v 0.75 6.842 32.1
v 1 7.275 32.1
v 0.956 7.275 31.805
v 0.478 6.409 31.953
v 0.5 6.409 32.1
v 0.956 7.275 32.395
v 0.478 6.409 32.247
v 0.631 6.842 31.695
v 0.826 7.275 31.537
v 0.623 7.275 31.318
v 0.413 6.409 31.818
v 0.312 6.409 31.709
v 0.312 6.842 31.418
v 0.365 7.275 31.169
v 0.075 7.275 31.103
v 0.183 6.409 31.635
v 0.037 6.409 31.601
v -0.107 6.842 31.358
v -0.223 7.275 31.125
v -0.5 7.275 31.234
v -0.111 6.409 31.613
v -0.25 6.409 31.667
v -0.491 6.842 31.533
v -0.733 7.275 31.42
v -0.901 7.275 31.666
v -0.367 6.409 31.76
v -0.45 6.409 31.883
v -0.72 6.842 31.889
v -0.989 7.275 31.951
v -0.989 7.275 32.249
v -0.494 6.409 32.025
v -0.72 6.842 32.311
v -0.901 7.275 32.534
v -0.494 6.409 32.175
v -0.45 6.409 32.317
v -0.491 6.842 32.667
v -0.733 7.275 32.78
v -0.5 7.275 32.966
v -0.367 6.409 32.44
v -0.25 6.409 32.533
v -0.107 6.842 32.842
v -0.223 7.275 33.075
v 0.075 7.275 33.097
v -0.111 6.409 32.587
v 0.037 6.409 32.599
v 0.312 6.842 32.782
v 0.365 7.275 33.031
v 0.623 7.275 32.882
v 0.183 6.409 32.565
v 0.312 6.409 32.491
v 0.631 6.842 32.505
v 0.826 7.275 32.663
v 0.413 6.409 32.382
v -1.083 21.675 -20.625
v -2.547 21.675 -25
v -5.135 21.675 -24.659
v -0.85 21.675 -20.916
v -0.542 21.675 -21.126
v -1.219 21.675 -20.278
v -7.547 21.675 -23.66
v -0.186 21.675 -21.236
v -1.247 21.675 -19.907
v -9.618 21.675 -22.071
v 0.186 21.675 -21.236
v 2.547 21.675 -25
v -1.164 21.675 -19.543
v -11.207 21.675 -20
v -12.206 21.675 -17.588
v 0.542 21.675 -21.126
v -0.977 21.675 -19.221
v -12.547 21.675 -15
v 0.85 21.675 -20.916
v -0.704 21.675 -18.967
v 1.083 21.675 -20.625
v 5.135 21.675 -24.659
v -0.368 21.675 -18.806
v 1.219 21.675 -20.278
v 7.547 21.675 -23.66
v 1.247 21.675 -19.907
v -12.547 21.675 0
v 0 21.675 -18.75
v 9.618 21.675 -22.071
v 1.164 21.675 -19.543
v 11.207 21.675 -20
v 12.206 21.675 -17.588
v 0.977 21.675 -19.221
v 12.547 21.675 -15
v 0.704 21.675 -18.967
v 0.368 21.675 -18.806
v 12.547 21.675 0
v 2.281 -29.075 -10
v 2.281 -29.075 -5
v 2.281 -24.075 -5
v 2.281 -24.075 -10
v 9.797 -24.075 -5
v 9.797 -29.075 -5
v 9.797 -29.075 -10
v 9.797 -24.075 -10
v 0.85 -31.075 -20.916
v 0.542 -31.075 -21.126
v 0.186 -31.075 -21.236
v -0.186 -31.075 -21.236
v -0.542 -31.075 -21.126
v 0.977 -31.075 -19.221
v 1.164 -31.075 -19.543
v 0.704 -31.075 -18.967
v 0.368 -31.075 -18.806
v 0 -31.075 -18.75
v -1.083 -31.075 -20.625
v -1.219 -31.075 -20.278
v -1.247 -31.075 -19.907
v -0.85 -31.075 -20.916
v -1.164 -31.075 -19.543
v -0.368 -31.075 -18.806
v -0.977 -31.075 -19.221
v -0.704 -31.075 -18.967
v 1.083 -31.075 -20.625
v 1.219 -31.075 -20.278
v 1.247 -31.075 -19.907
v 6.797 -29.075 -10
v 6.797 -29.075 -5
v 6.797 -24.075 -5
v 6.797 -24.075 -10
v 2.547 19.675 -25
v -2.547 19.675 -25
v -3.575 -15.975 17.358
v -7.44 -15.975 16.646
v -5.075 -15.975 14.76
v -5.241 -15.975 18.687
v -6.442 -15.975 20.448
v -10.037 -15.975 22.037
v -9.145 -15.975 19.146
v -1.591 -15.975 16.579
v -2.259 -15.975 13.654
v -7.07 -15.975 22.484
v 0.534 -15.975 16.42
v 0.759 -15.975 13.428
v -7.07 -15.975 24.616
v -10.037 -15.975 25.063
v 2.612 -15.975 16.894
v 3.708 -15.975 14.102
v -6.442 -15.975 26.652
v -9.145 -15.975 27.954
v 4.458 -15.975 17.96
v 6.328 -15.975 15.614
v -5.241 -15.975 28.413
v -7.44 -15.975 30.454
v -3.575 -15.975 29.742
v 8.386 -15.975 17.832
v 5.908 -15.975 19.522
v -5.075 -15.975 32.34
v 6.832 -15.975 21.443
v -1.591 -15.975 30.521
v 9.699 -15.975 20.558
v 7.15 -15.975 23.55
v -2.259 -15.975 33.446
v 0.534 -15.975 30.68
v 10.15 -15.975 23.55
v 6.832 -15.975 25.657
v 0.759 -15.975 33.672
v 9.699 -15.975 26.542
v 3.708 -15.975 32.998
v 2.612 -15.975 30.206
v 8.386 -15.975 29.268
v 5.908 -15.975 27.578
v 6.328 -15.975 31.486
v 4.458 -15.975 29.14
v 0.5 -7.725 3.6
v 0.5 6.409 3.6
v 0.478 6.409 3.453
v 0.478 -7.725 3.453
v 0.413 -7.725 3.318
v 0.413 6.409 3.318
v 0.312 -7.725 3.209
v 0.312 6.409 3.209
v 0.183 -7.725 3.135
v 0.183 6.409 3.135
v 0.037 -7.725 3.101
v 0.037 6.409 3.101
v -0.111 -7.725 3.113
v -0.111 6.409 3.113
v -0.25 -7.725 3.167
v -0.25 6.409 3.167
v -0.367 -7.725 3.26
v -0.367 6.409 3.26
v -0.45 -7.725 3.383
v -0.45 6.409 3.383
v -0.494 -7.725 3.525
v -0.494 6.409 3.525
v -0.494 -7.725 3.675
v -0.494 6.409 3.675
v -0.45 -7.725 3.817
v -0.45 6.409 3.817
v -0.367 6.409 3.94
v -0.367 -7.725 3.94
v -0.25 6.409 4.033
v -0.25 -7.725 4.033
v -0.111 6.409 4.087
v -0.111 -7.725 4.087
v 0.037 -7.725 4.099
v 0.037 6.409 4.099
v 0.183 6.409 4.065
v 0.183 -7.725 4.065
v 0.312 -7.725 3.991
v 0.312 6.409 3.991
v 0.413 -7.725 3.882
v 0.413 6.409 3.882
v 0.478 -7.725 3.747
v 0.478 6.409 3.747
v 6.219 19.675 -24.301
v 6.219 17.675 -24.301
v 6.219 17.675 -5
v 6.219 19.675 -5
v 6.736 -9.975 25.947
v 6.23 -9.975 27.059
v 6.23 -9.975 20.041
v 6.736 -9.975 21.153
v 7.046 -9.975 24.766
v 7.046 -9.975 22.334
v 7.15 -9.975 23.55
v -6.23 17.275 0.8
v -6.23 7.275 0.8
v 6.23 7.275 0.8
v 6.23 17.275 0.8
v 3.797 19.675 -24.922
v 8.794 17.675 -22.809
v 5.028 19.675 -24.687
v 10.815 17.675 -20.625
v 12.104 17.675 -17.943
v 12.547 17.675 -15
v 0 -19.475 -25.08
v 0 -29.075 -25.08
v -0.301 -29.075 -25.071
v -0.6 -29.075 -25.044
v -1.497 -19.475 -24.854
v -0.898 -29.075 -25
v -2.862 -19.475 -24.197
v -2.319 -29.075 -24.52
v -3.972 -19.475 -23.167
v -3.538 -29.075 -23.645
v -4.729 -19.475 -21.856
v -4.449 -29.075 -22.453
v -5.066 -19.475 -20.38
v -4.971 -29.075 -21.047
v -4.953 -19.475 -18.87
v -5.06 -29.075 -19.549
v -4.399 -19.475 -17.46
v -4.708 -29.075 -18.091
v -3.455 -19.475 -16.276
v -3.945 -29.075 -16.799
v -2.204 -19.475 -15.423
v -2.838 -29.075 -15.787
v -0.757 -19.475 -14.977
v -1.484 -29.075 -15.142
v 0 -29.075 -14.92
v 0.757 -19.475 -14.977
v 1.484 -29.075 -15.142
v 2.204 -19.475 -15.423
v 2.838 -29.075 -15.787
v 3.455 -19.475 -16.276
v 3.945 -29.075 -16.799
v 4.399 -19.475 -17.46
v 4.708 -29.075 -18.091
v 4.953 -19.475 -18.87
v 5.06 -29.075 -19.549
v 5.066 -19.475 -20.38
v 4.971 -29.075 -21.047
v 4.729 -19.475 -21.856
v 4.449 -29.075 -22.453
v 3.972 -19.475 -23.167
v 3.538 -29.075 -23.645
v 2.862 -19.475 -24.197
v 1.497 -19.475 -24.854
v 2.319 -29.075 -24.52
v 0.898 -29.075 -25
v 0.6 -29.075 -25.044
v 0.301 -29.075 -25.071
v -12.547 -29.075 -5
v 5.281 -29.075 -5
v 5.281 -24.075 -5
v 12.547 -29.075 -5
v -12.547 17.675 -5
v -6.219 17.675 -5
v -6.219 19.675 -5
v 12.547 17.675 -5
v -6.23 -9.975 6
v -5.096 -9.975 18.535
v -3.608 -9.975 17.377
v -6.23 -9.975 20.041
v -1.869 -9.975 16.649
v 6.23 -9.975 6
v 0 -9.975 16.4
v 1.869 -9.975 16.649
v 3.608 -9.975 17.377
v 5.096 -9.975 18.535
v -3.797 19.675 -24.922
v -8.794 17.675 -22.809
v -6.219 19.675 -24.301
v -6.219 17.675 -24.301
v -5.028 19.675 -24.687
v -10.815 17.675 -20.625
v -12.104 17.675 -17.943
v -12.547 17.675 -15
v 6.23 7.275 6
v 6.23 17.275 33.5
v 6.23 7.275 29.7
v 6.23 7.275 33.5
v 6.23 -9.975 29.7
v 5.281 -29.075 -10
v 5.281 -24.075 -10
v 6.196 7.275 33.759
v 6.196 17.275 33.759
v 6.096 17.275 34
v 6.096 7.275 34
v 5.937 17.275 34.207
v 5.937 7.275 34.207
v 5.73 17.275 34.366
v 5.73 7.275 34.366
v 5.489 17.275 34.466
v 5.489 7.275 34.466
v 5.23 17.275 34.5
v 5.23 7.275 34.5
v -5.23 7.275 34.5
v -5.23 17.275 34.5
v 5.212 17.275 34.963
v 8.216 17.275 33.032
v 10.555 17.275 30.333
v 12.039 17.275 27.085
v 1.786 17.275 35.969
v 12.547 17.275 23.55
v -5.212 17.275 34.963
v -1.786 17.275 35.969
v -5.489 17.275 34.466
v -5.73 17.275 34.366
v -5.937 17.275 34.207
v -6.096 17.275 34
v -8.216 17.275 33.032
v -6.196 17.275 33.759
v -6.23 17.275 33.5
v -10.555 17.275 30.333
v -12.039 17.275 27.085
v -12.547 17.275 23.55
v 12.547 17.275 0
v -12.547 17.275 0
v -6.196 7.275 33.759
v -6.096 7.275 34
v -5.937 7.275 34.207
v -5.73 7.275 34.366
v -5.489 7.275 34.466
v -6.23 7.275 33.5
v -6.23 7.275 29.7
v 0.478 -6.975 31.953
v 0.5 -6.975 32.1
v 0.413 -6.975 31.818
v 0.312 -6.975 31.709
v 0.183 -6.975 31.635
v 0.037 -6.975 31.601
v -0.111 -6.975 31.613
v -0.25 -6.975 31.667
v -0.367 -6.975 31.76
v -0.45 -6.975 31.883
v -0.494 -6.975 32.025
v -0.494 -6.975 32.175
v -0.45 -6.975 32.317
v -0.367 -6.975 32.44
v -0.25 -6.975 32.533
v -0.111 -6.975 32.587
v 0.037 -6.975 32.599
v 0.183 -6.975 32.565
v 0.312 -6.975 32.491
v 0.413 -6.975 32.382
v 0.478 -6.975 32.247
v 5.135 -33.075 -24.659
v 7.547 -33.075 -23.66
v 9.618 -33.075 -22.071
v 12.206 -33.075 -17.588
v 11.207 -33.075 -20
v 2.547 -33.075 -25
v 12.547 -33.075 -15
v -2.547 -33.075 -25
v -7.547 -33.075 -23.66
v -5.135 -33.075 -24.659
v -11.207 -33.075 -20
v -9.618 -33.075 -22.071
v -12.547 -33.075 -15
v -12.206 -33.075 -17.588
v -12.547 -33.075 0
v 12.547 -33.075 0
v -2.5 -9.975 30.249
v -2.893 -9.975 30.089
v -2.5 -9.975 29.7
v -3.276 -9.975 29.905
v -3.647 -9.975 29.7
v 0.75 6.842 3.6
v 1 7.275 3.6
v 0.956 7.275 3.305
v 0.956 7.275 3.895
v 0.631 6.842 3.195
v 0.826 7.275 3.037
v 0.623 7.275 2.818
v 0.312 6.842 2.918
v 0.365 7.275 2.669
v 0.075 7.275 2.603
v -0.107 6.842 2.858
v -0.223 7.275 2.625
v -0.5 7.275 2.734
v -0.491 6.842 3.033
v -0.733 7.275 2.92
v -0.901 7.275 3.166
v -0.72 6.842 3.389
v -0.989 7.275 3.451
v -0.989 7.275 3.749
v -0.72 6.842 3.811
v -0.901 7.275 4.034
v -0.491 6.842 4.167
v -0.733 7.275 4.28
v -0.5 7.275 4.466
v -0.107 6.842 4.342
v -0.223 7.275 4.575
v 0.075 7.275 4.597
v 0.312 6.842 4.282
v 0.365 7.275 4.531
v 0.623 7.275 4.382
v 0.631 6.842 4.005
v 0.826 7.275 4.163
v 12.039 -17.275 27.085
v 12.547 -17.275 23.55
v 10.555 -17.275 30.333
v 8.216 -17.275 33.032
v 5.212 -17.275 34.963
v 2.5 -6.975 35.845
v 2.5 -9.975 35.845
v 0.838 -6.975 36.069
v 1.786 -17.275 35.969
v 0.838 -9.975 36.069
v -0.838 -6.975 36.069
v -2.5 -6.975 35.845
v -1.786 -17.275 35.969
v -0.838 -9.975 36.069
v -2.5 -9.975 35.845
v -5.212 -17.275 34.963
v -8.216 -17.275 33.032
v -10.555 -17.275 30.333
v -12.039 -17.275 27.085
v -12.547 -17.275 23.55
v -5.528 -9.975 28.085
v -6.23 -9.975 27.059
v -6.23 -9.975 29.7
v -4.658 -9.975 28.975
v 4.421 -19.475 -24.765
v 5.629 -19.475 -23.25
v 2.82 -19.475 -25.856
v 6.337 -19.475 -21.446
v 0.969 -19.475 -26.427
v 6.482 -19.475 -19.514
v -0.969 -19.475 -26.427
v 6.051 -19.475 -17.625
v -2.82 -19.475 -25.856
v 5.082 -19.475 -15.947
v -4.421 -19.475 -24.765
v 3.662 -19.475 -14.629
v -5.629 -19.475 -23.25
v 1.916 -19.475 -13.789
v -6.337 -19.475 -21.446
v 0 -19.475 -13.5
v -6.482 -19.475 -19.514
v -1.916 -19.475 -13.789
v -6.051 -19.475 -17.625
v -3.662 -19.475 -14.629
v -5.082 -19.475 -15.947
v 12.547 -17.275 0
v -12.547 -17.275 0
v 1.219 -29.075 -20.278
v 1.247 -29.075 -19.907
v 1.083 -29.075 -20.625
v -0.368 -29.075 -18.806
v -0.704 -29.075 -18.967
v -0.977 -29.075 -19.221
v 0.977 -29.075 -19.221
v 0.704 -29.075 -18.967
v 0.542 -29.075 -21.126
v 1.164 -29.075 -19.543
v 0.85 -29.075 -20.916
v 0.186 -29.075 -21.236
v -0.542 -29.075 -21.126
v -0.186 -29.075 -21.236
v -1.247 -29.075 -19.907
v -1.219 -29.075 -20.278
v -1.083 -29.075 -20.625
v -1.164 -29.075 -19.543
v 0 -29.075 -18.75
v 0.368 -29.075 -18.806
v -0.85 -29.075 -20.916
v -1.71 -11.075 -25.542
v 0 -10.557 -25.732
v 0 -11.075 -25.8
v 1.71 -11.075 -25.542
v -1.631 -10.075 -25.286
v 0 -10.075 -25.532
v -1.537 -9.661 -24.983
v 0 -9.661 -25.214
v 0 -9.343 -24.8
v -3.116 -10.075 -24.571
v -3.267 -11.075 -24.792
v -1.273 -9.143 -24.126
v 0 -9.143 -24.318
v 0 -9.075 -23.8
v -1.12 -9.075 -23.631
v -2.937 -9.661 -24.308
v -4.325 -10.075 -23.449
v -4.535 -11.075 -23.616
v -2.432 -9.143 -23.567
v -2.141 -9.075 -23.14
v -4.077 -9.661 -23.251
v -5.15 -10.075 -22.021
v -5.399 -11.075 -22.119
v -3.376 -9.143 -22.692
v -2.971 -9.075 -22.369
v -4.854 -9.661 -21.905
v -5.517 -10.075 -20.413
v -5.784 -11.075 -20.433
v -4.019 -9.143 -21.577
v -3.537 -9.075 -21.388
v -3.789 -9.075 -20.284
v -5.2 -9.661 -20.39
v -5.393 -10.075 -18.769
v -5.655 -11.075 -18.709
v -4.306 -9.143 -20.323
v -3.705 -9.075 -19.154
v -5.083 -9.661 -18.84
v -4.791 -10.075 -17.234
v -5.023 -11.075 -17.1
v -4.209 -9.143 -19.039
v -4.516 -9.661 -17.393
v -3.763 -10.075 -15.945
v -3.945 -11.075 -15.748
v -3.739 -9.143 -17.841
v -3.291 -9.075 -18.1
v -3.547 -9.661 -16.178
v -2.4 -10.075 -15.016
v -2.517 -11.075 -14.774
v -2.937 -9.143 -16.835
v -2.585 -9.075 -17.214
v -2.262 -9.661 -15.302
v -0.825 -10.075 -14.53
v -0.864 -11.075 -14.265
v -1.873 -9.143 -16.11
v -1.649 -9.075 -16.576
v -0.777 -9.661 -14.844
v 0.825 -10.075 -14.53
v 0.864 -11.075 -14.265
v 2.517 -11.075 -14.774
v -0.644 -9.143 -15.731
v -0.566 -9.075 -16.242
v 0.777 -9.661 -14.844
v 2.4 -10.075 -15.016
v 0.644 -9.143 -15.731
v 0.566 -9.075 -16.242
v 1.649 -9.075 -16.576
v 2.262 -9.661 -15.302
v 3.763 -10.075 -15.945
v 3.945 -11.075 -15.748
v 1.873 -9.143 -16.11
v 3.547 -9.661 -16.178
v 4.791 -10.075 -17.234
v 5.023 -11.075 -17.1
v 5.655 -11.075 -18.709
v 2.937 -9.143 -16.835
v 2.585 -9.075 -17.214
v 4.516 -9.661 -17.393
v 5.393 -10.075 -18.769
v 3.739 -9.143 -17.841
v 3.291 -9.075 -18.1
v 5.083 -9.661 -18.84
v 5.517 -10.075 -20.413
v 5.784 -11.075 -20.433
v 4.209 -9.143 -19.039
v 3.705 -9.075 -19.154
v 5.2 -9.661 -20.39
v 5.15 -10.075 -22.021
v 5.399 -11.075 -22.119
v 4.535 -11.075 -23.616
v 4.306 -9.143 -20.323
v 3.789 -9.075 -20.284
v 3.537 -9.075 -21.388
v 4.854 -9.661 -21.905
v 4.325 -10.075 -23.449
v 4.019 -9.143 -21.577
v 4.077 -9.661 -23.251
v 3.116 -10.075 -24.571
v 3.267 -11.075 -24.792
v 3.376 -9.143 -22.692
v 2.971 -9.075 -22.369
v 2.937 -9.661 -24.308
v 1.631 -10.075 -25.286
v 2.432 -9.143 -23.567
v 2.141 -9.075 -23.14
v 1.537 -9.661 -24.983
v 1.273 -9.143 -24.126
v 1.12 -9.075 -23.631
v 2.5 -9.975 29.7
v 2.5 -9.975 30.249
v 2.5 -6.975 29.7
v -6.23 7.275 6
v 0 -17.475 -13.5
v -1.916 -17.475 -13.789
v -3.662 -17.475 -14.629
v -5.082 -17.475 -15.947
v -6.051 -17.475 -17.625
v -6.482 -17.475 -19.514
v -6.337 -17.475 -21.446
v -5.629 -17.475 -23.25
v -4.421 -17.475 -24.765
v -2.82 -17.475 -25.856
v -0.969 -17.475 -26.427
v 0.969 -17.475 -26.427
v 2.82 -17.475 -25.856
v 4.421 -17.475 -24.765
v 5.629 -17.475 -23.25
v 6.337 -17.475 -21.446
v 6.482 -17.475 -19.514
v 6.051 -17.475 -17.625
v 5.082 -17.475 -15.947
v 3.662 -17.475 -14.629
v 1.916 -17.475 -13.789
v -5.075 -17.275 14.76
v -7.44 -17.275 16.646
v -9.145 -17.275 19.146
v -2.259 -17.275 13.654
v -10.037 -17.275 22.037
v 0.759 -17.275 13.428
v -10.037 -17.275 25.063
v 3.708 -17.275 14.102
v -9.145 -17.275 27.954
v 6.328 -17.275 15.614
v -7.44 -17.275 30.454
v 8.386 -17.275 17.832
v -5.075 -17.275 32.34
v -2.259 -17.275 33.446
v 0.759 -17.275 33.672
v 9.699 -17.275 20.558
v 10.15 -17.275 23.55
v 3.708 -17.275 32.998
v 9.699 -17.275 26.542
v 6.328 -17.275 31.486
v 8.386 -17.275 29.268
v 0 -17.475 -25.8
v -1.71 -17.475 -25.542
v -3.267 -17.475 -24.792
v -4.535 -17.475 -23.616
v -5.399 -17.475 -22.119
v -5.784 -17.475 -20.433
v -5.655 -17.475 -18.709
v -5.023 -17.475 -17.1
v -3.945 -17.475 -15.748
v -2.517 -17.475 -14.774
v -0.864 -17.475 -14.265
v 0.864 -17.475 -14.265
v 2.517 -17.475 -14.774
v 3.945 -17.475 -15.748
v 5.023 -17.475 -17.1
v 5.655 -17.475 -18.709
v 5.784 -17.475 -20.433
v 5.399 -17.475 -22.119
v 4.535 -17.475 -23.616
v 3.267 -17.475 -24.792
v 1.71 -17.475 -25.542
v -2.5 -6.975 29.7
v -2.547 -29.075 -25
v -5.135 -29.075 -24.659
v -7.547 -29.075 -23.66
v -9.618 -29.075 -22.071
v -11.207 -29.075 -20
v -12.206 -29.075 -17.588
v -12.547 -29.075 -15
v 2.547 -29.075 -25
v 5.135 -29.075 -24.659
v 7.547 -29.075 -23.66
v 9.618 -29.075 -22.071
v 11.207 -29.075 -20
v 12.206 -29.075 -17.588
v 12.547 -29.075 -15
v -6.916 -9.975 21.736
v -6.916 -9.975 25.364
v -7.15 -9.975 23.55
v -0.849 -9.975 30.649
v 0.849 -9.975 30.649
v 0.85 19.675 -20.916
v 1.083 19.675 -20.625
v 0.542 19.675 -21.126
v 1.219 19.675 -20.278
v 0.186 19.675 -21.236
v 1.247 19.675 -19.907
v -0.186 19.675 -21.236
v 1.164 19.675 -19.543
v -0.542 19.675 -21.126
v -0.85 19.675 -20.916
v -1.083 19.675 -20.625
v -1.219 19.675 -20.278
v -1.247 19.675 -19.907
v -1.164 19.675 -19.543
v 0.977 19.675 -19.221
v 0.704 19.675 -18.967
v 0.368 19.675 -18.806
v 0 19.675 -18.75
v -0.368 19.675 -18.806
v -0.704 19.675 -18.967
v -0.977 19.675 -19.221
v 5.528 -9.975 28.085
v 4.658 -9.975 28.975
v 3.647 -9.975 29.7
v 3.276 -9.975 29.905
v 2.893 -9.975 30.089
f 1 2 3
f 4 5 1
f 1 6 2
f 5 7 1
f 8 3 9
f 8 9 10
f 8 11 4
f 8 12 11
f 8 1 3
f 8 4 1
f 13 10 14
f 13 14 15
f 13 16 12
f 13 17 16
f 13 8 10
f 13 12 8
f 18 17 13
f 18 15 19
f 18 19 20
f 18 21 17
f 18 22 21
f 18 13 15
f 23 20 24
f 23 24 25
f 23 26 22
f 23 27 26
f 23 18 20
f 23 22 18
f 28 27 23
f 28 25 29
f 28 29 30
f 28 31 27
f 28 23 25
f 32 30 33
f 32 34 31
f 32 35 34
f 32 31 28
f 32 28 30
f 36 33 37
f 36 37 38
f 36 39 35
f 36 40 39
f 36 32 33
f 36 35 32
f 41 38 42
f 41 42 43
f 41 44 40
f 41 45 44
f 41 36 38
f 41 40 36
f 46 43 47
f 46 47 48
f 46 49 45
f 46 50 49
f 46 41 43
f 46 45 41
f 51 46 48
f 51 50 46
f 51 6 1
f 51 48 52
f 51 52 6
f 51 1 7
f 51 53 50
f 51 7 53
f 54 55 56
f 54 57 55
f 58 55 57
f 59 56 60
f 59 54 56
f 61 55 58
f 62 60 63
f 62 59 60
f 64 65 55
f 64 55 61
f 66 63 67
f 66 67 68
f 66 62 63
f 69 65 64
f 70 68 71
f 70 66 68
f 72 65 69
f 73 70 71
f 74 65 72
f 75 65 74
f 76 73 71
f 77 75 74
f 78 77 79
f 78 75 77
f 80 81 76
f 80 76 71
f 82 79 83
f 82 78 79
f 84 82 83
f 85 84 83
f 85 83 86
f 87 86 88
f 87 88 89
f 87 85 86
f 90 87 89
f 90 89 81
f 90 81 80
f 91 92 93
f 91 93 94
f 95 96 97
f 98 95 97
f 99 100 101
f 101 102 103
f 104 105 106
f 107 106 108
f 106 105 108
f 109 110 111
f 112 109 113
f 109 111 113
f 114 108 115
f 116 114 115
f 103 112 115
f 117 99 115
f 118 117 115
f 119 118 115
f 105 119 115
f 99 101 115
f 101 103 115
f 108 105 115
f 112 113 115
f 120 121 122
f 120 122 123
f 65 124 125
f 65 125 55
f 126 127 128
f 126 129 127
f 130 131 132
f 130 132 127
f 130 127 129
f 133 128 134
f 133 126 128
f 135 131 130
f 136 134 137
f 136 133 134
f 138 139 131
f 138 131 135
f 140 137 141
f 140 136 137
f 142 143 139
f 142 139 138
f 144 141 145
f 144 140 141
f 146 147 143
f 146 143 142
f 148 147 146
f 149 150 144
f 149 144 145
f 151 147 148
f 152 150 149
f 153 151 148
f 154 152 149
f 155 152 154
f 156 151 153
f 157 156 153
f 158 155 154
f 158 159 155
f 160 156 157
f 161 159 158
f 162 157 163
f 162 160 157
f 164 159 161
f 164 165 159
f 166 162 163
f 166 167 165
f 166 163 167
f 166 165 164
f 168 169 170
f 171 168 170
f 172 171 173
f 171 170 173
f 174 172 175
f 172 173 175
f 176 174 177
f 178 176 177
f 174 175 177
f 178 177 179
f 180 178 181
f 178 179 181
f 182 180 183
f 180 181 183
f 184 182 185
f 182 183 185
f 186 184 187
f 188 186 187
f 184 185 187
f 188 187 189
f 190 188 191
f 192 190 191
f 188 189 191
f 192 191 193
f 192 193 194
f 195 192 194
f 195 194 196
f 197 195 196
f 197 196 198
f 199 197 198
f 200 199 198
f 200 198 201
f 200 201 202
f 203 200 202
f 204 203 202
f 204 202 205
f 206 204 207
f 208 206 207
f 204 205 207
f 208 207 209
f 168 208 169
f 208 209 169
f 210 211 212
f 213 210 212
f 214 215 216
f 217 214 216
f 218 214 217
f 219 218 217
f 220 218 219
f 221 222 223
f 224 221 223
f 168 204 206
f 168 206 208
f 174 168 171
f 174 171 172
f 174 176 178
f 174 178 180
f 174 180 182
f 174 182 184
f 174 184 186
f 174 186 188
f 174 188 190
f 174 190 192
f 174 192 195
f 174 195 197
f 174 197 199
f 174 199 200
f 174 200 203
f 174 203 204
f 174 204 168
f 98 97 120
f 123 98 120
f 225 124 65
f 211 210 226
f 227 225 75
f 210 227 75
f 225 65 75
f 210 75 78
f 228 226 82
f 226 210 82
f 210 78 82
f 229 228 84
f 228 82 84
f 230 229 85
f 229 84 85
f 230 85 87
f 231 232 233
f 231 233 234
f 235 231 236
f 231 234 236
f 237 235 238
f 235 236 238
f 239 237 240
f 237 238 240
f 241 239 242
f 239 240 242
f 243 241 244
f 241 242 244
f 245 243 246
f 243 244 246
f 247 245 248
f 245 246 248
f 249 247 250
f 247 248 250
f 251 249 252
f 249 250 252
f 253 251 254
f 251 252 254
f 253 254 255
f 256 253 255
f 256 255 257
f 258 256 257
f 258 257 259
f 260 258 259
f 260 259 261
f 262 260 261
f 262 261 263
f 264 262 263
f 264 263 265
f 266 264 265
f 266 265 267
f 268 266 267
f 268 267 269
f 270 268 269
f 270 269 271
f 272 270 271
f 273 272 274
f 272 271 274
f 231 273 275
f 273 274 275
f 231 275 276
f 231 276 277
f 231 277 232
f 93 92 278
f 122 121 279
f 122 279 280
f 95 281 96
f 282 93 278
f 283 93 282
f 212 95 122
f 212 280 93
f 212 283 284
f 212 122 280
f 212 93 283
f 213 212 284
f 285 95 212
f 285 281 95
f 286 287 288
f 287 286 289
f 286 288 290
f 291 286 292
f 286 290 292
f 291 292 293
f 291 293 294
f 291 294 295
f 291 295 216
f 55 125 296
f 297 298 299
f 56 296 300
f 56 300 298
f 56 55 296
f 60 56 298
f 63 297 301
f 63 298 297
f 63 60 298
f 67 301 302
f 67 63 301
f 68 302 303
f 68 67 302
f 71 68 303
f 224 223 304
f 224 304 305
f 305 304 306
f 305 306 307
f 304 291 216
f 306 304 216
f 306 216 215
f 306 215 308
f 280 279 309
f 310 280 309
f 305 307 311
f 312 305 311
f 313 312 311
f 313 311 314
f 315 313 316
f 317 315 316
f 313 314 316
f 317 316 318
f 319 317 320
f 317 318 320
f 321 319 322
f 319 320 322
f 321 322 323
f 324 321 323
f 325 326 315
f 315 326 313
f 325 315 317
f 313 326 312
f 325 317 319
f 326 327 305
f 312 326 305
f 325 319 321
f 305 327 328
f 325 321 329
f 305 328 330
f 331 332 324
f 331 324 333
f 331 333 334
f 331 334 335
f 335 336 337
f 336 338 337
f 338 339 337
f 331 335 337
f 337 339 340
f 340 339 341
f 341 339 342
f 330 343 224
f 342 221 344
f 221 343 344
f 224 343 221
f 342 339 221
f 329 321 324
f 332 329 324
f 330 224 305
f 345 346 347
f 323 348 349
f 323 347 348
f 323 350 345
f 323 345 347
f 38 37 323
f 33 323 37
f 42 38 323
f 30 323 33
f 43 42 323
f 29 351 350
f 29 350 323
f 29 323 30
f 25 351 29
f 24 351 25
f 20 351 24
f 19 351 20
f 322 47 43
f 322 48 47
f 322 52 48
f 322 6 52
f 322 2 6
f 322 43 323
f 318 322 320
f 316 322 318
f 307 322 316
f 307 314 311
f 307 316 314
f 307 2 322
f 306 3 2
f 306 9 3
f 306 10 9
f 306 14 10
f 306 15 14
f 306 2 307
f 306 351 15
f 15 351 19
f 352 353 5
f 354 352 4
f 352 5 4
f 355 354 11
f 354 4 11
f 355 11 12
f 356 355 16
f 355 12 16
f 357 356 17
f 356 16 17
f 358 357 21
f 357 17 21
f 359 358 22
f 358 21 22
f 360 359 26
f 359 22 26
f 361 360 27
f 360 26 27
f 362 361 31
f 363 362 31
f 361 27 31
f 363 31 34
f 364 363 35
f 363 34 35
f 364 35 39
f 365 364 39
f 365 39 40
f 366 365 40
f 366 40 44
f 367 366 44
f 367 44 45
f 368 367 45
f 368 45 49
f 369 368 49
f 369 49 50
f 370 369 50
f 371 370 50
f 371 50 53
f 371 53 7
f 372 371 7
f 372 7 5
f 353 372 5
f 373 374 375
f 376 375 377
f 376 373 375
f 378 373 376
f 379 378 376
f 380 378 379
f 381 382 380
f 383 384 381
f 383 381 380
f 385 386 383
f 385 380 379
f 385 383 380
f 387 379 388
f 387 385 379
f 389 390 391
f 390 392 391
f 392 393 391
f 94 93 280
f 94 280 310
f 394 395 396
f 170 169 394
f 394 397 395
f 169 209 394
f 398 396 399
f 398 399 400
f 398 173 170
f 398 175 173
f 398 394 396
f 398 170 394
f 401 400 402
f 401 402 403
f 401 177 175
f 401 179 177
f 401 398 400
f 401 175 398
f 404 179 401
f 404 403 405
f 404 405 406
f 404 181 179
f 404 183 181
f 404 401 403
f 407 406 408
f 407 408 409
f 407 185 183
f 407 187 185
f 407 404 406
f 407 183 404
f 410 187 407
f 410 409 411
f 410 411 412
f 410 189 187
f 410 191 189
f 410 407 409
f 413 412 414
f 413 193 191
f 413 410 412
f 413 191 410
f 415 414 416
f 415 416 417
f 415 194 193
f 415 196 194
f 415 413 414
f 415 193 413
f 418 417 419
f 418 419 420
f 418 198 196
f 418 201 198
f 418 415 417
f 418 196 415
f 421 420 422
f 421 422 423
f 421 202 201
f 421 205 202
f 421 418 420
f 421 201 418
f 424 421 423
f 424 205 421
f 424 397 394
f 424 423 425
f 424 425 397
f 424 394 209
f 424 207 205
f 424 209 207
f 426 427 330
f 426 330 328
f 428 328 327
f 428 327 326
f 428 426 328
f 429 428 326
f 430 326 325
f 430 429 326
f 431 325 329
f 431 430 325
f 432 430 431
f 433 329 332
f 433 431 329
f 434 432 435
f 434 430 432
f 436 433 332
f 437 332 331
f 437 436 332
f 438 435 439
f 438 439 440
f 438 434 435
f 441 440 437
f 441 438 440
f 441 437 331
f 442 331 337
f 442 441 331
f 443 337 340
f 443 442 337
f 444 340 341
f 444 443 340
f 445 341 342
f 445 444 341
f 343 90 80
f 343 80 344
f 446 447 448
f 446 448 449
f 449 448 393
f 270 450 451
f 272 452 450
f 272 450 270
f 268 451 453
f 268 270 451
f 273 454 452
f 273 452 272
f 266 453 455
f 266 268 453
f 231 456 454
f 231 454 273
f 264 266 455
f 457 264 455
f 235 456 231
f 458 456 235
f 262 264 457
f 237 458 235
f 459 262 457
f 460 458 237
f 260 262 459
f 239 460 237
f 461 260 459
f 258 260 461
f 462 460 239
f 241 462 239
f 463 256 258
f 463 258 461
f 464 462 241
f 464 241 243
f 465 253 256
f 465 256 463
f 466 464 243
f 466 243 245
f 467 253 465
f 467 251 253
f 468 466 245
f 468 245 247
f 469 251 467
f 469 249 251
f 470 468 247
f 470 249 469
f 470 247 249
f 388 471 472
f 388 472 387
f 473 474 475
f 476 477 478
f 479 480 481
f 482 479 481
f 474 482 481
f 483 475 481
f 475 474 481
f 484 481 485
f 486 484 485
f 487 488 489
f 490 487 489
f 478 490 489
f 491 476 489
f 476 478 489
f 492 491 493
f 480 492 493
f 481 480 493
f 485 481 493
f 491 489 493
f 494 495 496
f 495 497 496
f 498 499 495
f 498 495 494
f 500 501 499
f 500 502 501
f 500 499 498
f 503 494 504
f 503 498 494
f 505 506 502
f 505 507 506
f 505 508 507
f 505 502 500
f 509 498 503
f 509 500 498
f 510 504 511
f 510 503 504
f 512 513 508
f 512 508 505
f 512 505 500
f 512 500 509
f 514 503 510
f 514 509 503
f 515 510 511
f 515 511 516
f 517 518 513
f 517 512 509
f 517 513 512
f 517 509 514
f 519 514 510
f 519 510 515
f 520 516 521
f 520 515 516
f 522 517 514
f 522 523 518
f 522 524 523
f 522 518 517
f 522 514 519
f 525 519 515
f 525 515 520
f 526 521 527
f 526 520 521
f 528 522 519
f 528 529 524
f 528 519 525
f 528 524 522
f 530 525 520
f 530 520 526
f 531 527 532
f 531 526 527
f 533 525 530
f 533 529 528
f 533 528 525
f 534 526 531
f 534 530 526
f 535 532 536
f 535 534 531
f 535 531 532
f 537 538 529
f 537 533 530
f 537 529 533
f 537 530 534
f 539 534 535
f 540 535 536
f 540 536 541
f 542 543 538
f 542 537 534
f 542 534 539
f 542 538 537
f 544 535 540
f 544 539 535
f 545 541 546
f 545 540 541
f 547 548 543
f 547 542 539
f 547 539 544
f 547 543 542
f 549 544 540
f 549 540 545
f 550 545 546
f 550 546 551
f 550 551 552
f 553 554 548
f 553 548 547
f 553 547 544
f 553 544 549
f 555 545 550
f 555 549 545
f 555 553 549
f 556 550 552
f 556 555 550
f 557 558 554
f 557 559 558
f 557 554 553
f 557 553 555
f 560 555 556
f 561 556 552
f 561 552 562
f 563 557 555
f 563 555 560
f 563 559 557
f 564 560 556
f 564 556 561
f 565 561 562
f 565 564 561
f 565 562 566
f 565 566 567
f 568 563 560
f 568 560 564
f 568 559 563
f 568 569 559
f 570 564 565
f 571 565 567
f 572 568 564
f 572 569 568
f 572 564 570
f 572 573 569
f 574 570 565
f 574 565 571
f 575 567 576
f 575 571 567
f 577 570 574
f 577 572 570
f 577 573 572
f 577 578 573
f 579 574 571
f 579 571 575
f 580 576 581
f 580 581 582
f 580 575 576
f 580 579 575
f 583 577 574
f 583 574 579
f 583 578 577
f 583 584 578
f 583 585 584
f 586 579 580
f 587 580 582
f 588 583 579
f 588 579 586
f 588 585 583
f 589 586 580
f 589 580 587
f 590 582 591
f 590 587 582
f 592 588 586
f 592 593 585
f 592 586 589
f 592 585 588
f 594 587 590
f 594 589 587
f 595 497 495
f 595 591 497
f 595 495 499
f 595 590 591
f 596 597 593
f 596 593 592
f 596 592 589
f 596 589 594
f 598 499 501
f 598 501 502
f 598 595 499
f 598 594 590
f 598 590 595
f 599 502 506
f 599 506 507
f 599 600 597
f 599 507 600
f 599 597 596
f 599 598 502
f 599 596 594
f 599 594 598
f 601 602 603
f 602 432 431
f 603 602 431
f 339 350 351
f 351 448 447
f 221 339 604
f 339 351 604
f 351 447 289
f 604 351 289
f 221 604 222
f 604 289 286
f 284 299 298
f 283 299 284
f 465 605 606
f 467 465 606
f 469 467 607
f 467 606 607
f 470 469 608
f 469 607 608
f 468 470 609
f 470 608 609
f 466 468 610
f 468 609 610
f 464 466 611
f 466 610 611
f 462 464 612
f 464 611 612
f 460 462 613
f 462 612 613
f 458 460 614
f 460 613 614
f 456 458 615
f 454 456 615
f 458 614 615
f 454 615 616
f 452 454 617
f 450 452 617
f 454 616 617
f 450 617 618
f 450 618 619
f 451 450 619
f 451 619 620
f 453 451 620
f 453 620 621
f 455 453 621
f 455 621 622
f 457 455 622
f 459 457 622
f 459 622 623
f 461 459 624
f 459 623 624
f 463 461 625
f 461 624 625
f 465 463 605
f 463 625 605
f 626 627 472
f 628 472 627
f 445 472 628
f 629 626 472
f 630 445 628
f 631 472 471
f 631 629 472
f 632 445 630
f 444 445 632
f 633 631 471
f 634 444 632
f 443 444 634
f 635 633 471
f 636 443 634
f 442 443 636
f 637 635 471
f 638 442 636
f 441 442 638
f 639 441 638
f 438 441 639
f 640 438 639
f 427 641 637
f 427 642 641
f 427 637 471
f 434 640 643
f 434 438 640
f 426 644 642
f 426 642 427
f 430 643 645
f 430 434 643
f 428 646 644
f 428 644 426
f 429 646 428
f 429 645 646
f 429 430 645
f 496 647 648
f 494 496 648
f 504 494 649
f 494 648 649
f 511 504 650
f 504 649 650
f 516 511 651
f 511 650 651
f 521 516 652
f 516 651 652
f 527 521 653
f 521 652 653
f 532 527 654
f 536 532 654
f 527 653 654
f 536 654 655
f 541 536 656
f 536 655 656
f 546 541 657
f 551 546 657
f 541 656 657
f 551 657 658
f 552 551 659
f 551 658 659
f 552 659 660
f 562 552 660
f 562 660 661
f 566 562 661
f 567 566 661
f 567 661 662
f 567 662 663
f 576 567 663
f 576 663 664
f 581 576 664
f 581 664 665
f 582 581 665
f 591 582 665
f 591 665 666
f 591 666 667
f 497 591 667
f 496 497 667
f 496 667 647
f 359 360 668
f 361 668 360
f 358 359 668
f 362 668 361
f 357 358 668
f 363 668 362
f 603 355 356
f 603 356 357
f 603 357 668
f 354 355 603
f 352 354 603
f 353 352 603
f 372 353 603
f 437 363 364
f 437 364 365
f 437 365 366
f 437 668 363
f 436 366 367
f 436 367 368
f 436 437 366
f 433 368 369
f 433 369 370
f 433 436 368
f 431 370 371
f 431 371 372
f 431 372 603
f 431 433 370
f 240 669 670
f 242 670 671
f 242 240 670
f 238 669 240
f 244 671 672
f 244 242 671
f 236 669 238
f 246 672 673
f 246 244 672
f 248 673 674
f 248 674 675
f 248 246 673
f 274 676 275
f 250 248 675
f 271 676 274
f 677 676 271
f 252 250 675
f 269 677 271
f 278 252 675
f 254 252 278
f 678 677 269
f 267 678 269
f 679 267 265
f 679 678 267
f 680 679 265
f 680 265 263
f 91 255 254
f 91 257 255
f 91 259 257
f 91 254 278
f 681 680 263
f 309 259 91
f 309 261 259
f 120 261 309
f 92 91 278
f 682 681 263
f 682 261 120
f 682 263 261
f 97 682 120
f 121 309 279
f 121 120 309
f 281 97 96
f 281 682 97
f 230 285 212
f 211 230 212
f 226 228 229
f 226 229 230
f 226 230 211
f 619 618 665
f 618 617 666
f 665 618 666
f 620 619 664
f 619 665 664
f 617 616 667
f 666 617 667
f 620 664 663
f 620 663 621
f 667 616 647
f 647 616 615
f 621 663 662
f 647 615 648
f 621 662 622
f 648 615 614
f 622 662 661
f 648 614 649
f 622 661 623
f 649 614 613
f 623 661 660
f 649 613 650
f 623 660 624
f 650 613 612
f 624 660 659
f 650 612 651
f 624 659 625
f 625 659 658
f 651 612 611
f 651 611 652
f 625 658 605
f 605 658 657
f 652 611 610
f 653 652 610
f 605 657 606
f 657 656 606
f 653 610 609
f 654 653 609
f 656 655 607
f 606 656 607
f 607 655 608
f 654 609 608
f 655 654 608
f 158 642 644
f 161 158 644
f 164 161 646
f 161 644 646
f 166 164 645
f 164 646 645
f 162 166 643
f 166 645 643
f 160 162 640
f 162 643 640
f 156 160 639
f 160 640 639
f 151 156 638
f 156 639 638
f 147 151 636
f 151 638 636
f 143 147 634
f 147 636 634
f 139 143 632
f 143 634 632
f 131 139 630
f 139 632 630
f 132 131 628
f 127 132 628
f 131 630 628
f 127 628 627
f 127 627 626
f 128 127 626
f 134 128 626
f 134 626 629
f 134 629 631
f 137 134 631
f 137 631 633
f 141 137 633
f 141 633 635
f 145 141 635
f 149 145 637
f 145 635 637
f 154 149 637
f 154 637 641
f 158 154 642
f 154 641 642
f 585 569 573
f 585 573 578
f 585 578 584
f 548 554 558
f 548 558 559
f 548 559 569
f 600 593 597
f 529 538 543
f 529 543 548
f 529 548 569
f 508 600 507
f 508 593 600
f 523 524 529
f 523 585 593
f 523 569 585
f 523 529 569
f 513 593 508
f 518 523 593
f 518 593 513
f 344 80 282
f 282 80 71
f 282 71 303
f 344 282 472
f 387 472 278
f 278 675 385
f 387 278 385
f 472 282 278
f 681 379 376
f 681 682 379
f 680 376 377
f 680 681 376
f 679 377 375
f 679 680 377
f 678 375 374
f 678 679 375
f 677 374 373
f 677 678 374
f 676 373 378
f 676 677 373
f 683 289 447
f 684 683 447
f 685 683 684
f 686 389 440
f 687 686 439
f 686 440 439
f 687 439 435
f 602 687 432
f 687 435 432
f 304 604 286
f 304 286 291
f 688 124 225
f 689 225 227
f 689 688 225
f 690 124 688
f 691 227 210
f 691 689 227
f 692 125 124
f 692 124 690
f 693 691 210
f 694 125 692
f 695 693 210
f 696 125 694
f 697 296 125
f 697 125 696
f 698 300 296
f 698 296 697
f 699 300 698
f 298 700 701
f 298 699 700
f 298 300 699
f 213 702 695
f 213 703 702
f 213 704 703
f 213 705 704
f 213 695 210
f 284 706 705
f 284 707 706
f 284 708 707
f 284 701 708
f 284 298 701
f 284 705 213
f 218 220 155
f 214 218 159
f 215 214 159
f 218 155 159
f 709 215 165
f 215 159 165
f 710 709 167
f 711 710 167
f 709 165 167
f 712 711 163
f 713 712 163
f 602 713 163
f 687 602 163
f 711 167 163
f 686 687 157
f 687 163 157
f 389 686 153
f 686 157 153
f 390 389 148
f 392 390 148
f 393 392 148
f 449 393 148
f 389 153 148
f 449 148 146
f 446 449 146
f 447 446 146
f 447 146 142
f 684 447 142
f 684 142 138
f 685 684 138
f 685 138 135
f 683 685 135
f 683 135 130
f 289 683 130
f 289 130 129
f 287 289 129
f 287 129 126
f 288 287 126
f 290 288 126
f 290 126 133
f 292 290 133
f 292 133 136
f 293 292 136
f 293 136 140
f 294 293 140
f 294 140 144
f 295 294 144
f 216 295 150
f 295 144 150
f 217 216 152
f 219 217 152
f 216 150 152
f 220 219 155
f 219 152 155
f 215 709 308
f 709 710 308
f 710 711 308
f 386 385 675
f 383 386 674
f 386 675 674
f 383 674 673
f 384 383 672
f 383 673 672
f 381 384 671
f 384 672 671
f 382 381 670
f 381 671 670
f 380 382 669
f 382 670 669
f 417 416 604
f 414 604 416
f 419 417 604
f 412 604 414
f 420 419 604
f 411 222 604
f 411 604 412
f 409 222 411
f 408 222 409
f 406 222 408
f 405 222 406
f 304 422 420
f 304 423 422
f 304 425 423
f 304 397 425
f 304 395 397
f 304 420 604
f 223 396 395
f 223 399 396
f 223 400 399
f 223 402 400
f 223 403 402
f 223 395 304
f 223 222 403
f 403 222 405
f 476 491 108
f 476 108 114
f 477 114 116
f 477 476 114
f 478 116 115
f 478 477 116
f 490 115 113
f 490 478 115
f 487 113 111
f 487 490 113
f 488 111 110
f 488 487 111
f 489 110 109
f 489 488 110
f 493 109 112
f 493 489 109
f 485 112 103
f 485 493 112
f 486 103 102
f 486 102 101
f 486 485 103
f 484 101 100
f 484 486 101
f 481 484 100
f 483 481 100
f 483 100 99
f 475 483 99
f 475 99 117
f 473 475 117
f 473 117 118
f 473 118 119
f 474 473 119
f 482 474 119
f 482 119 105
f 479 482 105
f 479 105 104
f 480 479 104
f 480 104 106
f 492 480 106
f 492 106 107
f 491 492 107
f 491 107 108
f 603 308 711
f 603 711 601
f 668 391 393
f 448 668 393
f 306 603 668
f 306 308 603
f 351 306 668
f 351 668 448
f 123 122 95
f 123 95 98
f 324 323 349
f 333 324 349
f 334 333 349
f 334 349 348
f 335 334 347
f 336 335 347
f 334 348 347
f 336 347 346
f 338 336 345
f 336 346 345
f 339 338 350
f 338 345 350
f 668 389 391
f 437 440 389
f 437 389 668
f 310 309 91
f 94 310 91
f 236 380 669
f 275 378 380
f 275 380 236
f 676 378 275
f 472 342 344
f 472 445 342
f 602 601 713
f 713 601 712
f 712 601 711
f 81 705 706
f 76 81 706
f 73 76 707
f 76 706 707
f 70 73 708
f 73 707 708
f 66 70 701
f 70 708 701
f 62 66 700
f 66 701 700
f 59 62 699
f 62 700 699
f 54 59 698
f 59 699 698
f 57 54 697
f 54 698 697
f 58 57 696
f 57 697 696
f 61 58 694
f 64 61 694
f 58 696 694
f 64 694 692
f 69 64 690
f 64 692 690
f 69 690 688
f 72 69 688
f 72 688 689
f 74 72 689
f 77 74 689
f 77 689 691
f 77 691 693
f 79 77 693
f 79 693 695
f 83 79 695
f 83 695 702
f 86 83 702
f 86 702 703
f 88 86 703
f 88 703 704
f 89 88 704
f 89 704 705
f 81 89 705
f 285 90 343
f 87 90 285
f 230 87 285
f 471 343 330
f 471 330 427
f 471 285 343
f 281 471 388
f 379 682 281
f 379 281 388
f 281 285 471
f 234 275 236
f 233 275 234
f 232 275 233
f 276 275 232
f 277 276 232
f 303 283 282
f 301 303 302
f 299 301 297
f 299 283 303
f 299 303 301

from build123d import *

# Parameters (mm, degrees)
SKETCH4_W                = 12.46
SKETCH4_H                = 17.25
BOSS_EXTRUDE3_DEPTH      = 6
SKETCH8_R                = 12.546781182
SKETCH8_R_2              = 11.15
BOSS_EXTRUDE6_DEPTH      = 7.3
BOSS_EXTRUDE6_DEPTH_BACK = 17.25
BOSS_EXTRUDE4_DEPTH      = 17.25
SKETCH6_R                = 0.5
CUT_EXTRUDE1_DEPTH       = 15
CHAMFER1_SIZE            = 0.5
CHAMFER1_SIZE2           = 0.866025404
SKETCH10_W               = 12.46
SKETCH10_H               = 23.7
CUT_EXTRUDE3_DEPTH       = 17.25
CUT_EXTRUDE4_REACH       = 38.097
SKETCH11_W               = 5
SKETCH11_H               = 3
BOSS_EXTRUDE7_DEPTH      = 7.3
BOSS_EXTRUDE9_DEPTH      = 10
SKETCH20_R               = 11.15
SKETCH20_R_2             = 7.15
BOSS_EXTRUDE11_DEPTH     = 7.3
SKETCH21_R               = 10.15
SKETCH21_R_2             = 7.15
CUT_EXTRUDE7_DEPTH       = 1.3
BOSS_EXTRUDE10_DEPTH     = 25.093562
SKETCH18_W               = 20
SKETCH18_H               = 12.438292938
CUT_EXTRUDE5_DEPTH       = 2
SKETCH19_R               = 1.25
CUT_EXTRUDE6_DEPTH       = 53.75
CUT_EXTRUDE6_DEPTH_BACK  = 3
FILLET1_R                = 10
SKETCH22_R               = 5.8
BOSS_EXTRUDE12_DEPTH     = 20
FILLET2_R                = 2
SKETCH23_R               = 5.930854157
SKETCH23_R_2             = 5.08
CUT_EXTRUDE8_DEPTH       = 11.6
SKETCH24_R               = 6.5
BOSS_EXTRUDE13_DEPTH     = 2
SKETCH25_R               = 1.25
BOSS_EXTRUDE14_DEPTH     = 2
SKETCH26_W               = 5
SKETCH26_H               = 3
BOSS_EXTRUDE15_DEPTH     = 5


with BuildPart() as part:
    # Sketch4 → Boss-Extrude3 (new body)
    with BuildSketch(Plane.XY):
        with Locations((0, -1.35)):
            Rectangle(SKETCH4_W, SKETCH4_H)
    extrude(amount=BOSS_EXTRUDE3_DEPTH)



with BuildPart() as body_2:
    # Sketch8 → Boss-Extrude6 (new body, two sides)
    with BuildSketch(Plane(origin=(0, -9.975, 0), x_dir=(-1, 0, 0), z_dir=(0, -1, 0))) as boss_extrude6_sk:
        with Locations((0, -23.55)):
            Circle(SKETCH8_R)
        with Locations((0, -23.55)):
            Circle(SKETCH8_R_2, mode=Mode.SUBTRACT)
    extrude(amount=BOSS_EXTRUDE6_DEPTH)
    extrude(boss_extrude6_sk.sketch, amount=-BOSS_EXTRUDE6_DEPTH_BACK)


with BuildPart() as part_1:
    add(part.part)

    add(body_2.part)  # Boss-Extrude4 merges body 2
    # Sketch5 → Boss-Extrude4 (add)
    with BuildSketch(Plane(origin=(0, 7.275, 0), x_dir=(1, 0, 0), z_dir=(0, 1, 0))):
        with BuildLine():
            Line((12.546781182, -23.55), (12.546781182, 0))
            Line((12.546781182, 0), (6.23, 0))
            Line((6.23, 0), (6.23, -29.7))
            Line((6.23, -29.7), (-6.23, -29.7))
            Line((-6.23, -29.7), (-6.23, 0))
            Line((-6.23, 0), (-12.546781182, 0))
            Line((-12.546781182, 0), (-12.546781182, -23.55))
            ThreePointArc((-12.546781182, -23.55), (0, -36.096781182), (12.546781182, -23.55))
        make_face()
    extrude(amount=-BOSS_EXTRUDE4_DEPTH)

    # Sketch6 → Cut-Extrude1 (cut)
    with BuildSketch(Plane(origin=(0, 7.275, 0), x_dir=(1, 0, 0), z_dir=(0, 1, 0))):
        with Locations((0, -3.6)):
            Circle(SKETCH6_R)
        with Locations((0, -32.1)):
            Circle(SKETCH6_R)
    extrude(amount=-CUT_EXTRUDE1_DEPTH, mode=Mode.SUBTRACT)

    # Chamfer1
    chamfer1_edges = [part_1.edges().sort_by_distance(p)[0] for p in [
        (-0.5, 7.275, 3.6),
        (-0.5, 7.275, 32.1),
    ]]
    chamfer1_side = [part_1.faces().sort_by_distance(p)[0] for p in [
        (0, 7.275, 35.657160381),
    ]]
    chamfer(chamfer1_edges, length=CHAMFER1_SIZE, length2=CHAMFER1_SIZE2, reference=chamfer1_side[0])

    # Sketch10 → Cut-Extrude3 (cut)
    with BuildSketch(Plane(origin=(0, 7.275, 0), x_dir=(1, 0, 0), z_dir=(0, 1, 0))):
        with Locations((0, -17.85)):
            Rectangle(SKETCH10_W, SKETCH10_H)
    extrude(amount=-CUT_EXTRUDE3_DEPTH, mode=Mode.SUBTRACT)

    # Sketch11 → Cut-Extrude4 (cut, up to next)
    with BuildSketch(Plane.XY.offset(36.096781182), mode=Mode.PRIVATE) as cut_extrude4_sk1:
        with Locations((0, -8.475)):
            Rectangle(SKETCH11_W, SKETCH11_H)
    cut_extrude4_tool1 = extrude(cut_extrude4_sk1.sketch, amount=-CUT_EXTRUDE4_REACH, mode=Mode.PRIVATE) & part_1.part
    add(cut_extrude4_tool1.solids().sort_by_distance((0, -8.475, 36.096781))[0], mode=Mode.SUBTRACT)

    # Sketch13 → Boss-Extrude7 (add)
    with BuildSketch(Plane.XZ.offset(17.275)):
        with BuildLine():
            Line((-12.546781182, 23.55), (-12.546781182, 0))
            Line((-12.546781182, 0), (12.546781182, 0))
            Line((12.546781182, 0), (12.546781182, 23.55))
            ThreePointArc((12.546781182, 23.55), (0, 11.003218818), (-12.546781182, 23.55))
        make_face()
    extrude(amount=-BOSS_EXTRUDE7_DEPTH)

    # Sketch15 → Boss-Extrude9 (add)
    with BuildSketch(Plane(origin=(0, 7.275, 0), x_dir=(1, 0, 0), z_dir=(0, 1, 0))):
        with BuildLine():
            Line((-12.546781182, 0), (12.546781182, 0))
            Line((12.546781182, 0), (12.546781182, -23.55))
            ThreePointArc((12.546781182, -23.55), (0, -36.096781182), (-12.546781182, -23.55))
            Line((-12.546781182, -23.55), (-12.546781182, 0))
        make_face()
        with BuildLine():
            Line((-6.23, -0.8), (6.23, -0.8))
            Line((6.23, -0.8), (6.23, -33.5))
            ThreePointArc((6.23, -33.5), (5.937106781, -34.207106781), (5.23, -34.5))
            Line((5.23, -34.5), (-5.23, -34.5))
            ThreePointArc((-5.23, -34.5), (-5.937106781, -34.207106781), (-6.23, -33.5))
            Line((-6.23, -33.5), (-6.23, -0.8))
        make_face(mode=Mode.SUBTRACT)
    extrude(amount=BOSS_EXTRUDE9_DEPTH)

    # Sketch20 → Boss-Extrude11 (add)
    with BuildSketch(Plane.XZ.offset(17.275)):
        with Locations((0, 23.55)):
            Circle(SKETCH20_R)
        with Locations((0, 23.55)):
            Circle(SKETCH20_R_2, mode=Mode.SUBTRACT)
    extrude(amount=-BOSS_EXTRUDE11_DEPTH)

    # Sketch21 → Cut-Extrude7 (cut)
    with BuildSketch(Plane.XZ.offset(17.275)):
        with Locations((0, 23.55)):
            Circle(SKETCH21_R)
        with Locations((0, 23.55)):
            Circle(SKETCH21_R_2, mode=Mode.SUBTRACT)
    extrude(amount=-CUT_EXTRUDE7_DEPTH, mode=Mode.SUBTRACT)

    # Sketch17 → Boss-Extrude10 (add)
    with BuildSketch(Plane(origin=(12.546781182, 4.728218818, 0), x_dir=(0, 1, 0), z_dir=(-1, 0, 0))):
        Polygon((16.946781182, 25), (16.946781182, 0), (-37.803218818, 0), (-37.803218818, 25), (-33.803218818, 25), (-33.803218818, 5), (12.946781182, 5), (12.946781182, 25), align=None)
    extrude(amount=BOSS_EXTRUDE10_DEPTH)

    # Sketch18 → Cut-Extrude5 (cut)
    with BuildSketch(Plane(origin=(0, 17.675, 0), x_dir=(0, 0, 1), z_dir=(0, -1, 0))):
        with Locations((-15, 0)):
            Rectangle(SKETCH18_W, SKETCH18_H)
    extrude(amount=-CUT_EXTRUDE5_DEPTH, mode=Mode.SUBTRACT)

    # Sketch19 → Cut-Extrude6 (cut, two sides)
    with BuildSketch(Plane(origin=(0, 19.675, 0), x_dir=(0, 0, 1), z_dir=(0, -1, 0))) as cut_extrude6_sk:
        with Locations((-20, 0)):
            Circle(SKETCH19_R)
    extrude(amount=CUT_EXTRUDE6_DEPTH, mode=Mode.SUBTRACT)
    extrude(cut_extrude6_sk.sketch, amount=-CUT_EXTRUDE6_DEPTH_BACK, mode=Mode.SUBTRACT)

    # Fillet1
    fillet1_edges = [part_1.edges().sort_by_distance(p)[0] for p in [
        (-12.546780818, 19.675, -25),
        (12.546781182, 19.675, -25),
        (-12.546780818, -31.075, -25),
        (12.546781182, -31.075, -25),
    ]]
    fillet(fillet1_edges, radius=FILLET1_R)

    # Sketch22 → Boss-Extrude12 (add)
    with BuildSketch(Plane(origin=(0, -29.075, 0), x_dir=(0, 0, -1), z_dir=(0, 1, 0))):
        with Locations((20, 0)):
            Circle(SKETCH22_R)
    extrude(amount=BOSS_EXTRUDE12_DEPTH)

    # Fillet2
    fillet2_edges = [part_1.edges().sort_by_distance(p)[0] for p in [
        (0, -9.075, -14.2),
    ]]
    fillet(fillet2_edges, radius=FILLET2_R)

    # Sketch23 → Cut-Extrude8 (cut)
    with BuildSketch(Plane(origin=(0, -29.075, 0), x_dir=(0, 0, -1), z_dir=(0, 1, 0))):
        with Locations((20, 0)):
            Circle(SKETCH23_R)
        with Locations((20, 0)):
            Circle(SKETCH23_R_2, mode=Mode.SUBTRACT)
    extrude(amount=CUT_EXTRUDE8_DEPTH, mode=Mode.SUBTRACT)

    # Sketch24 → Boss-Extrude13 (add)
    with BuildSketch(Plane(origin=(0, -17.475, 0), x_dir=(0, 0, 1), z_dir=(0, -1, 0))):
        with Locations((-20, 0)):
            Circle(SKETCH24_R)
    extrude(amount=BOSS_EXTRUDE13_DEPTH)

    # Sketch25 → Boss-Extrude14 (add)
    with BuildSketch(Plane(origin=(0, -33.075, 0), x_dir=(0, 0, 1), z_dir=(0, -1, 0))):
        with Locations((-20, 0)):
            Circle(SKETCH25_R)
    extrude(amount=-BOSS_EXTRUDE14_DEPTH)

    # Sketch26 → Boss-Extrude15 (add)
    with BuildSketch(Plane(origin=(0, -29.075, 0), x_dir=(0, 0, -1), z_dir=(0, 1, 0))):
        with Locations((7.5, -8.296781182)):
            Rectangle(SKETCH26_W, SKETCH26_H)
        with Locations((7.5, -3.780781182)):
            Rectangle(SKETCH26_W, SKETCH26_H)
    extrude(amount=BOSS_EXTRUDE15_DEPTH)


solid = part_1.part
